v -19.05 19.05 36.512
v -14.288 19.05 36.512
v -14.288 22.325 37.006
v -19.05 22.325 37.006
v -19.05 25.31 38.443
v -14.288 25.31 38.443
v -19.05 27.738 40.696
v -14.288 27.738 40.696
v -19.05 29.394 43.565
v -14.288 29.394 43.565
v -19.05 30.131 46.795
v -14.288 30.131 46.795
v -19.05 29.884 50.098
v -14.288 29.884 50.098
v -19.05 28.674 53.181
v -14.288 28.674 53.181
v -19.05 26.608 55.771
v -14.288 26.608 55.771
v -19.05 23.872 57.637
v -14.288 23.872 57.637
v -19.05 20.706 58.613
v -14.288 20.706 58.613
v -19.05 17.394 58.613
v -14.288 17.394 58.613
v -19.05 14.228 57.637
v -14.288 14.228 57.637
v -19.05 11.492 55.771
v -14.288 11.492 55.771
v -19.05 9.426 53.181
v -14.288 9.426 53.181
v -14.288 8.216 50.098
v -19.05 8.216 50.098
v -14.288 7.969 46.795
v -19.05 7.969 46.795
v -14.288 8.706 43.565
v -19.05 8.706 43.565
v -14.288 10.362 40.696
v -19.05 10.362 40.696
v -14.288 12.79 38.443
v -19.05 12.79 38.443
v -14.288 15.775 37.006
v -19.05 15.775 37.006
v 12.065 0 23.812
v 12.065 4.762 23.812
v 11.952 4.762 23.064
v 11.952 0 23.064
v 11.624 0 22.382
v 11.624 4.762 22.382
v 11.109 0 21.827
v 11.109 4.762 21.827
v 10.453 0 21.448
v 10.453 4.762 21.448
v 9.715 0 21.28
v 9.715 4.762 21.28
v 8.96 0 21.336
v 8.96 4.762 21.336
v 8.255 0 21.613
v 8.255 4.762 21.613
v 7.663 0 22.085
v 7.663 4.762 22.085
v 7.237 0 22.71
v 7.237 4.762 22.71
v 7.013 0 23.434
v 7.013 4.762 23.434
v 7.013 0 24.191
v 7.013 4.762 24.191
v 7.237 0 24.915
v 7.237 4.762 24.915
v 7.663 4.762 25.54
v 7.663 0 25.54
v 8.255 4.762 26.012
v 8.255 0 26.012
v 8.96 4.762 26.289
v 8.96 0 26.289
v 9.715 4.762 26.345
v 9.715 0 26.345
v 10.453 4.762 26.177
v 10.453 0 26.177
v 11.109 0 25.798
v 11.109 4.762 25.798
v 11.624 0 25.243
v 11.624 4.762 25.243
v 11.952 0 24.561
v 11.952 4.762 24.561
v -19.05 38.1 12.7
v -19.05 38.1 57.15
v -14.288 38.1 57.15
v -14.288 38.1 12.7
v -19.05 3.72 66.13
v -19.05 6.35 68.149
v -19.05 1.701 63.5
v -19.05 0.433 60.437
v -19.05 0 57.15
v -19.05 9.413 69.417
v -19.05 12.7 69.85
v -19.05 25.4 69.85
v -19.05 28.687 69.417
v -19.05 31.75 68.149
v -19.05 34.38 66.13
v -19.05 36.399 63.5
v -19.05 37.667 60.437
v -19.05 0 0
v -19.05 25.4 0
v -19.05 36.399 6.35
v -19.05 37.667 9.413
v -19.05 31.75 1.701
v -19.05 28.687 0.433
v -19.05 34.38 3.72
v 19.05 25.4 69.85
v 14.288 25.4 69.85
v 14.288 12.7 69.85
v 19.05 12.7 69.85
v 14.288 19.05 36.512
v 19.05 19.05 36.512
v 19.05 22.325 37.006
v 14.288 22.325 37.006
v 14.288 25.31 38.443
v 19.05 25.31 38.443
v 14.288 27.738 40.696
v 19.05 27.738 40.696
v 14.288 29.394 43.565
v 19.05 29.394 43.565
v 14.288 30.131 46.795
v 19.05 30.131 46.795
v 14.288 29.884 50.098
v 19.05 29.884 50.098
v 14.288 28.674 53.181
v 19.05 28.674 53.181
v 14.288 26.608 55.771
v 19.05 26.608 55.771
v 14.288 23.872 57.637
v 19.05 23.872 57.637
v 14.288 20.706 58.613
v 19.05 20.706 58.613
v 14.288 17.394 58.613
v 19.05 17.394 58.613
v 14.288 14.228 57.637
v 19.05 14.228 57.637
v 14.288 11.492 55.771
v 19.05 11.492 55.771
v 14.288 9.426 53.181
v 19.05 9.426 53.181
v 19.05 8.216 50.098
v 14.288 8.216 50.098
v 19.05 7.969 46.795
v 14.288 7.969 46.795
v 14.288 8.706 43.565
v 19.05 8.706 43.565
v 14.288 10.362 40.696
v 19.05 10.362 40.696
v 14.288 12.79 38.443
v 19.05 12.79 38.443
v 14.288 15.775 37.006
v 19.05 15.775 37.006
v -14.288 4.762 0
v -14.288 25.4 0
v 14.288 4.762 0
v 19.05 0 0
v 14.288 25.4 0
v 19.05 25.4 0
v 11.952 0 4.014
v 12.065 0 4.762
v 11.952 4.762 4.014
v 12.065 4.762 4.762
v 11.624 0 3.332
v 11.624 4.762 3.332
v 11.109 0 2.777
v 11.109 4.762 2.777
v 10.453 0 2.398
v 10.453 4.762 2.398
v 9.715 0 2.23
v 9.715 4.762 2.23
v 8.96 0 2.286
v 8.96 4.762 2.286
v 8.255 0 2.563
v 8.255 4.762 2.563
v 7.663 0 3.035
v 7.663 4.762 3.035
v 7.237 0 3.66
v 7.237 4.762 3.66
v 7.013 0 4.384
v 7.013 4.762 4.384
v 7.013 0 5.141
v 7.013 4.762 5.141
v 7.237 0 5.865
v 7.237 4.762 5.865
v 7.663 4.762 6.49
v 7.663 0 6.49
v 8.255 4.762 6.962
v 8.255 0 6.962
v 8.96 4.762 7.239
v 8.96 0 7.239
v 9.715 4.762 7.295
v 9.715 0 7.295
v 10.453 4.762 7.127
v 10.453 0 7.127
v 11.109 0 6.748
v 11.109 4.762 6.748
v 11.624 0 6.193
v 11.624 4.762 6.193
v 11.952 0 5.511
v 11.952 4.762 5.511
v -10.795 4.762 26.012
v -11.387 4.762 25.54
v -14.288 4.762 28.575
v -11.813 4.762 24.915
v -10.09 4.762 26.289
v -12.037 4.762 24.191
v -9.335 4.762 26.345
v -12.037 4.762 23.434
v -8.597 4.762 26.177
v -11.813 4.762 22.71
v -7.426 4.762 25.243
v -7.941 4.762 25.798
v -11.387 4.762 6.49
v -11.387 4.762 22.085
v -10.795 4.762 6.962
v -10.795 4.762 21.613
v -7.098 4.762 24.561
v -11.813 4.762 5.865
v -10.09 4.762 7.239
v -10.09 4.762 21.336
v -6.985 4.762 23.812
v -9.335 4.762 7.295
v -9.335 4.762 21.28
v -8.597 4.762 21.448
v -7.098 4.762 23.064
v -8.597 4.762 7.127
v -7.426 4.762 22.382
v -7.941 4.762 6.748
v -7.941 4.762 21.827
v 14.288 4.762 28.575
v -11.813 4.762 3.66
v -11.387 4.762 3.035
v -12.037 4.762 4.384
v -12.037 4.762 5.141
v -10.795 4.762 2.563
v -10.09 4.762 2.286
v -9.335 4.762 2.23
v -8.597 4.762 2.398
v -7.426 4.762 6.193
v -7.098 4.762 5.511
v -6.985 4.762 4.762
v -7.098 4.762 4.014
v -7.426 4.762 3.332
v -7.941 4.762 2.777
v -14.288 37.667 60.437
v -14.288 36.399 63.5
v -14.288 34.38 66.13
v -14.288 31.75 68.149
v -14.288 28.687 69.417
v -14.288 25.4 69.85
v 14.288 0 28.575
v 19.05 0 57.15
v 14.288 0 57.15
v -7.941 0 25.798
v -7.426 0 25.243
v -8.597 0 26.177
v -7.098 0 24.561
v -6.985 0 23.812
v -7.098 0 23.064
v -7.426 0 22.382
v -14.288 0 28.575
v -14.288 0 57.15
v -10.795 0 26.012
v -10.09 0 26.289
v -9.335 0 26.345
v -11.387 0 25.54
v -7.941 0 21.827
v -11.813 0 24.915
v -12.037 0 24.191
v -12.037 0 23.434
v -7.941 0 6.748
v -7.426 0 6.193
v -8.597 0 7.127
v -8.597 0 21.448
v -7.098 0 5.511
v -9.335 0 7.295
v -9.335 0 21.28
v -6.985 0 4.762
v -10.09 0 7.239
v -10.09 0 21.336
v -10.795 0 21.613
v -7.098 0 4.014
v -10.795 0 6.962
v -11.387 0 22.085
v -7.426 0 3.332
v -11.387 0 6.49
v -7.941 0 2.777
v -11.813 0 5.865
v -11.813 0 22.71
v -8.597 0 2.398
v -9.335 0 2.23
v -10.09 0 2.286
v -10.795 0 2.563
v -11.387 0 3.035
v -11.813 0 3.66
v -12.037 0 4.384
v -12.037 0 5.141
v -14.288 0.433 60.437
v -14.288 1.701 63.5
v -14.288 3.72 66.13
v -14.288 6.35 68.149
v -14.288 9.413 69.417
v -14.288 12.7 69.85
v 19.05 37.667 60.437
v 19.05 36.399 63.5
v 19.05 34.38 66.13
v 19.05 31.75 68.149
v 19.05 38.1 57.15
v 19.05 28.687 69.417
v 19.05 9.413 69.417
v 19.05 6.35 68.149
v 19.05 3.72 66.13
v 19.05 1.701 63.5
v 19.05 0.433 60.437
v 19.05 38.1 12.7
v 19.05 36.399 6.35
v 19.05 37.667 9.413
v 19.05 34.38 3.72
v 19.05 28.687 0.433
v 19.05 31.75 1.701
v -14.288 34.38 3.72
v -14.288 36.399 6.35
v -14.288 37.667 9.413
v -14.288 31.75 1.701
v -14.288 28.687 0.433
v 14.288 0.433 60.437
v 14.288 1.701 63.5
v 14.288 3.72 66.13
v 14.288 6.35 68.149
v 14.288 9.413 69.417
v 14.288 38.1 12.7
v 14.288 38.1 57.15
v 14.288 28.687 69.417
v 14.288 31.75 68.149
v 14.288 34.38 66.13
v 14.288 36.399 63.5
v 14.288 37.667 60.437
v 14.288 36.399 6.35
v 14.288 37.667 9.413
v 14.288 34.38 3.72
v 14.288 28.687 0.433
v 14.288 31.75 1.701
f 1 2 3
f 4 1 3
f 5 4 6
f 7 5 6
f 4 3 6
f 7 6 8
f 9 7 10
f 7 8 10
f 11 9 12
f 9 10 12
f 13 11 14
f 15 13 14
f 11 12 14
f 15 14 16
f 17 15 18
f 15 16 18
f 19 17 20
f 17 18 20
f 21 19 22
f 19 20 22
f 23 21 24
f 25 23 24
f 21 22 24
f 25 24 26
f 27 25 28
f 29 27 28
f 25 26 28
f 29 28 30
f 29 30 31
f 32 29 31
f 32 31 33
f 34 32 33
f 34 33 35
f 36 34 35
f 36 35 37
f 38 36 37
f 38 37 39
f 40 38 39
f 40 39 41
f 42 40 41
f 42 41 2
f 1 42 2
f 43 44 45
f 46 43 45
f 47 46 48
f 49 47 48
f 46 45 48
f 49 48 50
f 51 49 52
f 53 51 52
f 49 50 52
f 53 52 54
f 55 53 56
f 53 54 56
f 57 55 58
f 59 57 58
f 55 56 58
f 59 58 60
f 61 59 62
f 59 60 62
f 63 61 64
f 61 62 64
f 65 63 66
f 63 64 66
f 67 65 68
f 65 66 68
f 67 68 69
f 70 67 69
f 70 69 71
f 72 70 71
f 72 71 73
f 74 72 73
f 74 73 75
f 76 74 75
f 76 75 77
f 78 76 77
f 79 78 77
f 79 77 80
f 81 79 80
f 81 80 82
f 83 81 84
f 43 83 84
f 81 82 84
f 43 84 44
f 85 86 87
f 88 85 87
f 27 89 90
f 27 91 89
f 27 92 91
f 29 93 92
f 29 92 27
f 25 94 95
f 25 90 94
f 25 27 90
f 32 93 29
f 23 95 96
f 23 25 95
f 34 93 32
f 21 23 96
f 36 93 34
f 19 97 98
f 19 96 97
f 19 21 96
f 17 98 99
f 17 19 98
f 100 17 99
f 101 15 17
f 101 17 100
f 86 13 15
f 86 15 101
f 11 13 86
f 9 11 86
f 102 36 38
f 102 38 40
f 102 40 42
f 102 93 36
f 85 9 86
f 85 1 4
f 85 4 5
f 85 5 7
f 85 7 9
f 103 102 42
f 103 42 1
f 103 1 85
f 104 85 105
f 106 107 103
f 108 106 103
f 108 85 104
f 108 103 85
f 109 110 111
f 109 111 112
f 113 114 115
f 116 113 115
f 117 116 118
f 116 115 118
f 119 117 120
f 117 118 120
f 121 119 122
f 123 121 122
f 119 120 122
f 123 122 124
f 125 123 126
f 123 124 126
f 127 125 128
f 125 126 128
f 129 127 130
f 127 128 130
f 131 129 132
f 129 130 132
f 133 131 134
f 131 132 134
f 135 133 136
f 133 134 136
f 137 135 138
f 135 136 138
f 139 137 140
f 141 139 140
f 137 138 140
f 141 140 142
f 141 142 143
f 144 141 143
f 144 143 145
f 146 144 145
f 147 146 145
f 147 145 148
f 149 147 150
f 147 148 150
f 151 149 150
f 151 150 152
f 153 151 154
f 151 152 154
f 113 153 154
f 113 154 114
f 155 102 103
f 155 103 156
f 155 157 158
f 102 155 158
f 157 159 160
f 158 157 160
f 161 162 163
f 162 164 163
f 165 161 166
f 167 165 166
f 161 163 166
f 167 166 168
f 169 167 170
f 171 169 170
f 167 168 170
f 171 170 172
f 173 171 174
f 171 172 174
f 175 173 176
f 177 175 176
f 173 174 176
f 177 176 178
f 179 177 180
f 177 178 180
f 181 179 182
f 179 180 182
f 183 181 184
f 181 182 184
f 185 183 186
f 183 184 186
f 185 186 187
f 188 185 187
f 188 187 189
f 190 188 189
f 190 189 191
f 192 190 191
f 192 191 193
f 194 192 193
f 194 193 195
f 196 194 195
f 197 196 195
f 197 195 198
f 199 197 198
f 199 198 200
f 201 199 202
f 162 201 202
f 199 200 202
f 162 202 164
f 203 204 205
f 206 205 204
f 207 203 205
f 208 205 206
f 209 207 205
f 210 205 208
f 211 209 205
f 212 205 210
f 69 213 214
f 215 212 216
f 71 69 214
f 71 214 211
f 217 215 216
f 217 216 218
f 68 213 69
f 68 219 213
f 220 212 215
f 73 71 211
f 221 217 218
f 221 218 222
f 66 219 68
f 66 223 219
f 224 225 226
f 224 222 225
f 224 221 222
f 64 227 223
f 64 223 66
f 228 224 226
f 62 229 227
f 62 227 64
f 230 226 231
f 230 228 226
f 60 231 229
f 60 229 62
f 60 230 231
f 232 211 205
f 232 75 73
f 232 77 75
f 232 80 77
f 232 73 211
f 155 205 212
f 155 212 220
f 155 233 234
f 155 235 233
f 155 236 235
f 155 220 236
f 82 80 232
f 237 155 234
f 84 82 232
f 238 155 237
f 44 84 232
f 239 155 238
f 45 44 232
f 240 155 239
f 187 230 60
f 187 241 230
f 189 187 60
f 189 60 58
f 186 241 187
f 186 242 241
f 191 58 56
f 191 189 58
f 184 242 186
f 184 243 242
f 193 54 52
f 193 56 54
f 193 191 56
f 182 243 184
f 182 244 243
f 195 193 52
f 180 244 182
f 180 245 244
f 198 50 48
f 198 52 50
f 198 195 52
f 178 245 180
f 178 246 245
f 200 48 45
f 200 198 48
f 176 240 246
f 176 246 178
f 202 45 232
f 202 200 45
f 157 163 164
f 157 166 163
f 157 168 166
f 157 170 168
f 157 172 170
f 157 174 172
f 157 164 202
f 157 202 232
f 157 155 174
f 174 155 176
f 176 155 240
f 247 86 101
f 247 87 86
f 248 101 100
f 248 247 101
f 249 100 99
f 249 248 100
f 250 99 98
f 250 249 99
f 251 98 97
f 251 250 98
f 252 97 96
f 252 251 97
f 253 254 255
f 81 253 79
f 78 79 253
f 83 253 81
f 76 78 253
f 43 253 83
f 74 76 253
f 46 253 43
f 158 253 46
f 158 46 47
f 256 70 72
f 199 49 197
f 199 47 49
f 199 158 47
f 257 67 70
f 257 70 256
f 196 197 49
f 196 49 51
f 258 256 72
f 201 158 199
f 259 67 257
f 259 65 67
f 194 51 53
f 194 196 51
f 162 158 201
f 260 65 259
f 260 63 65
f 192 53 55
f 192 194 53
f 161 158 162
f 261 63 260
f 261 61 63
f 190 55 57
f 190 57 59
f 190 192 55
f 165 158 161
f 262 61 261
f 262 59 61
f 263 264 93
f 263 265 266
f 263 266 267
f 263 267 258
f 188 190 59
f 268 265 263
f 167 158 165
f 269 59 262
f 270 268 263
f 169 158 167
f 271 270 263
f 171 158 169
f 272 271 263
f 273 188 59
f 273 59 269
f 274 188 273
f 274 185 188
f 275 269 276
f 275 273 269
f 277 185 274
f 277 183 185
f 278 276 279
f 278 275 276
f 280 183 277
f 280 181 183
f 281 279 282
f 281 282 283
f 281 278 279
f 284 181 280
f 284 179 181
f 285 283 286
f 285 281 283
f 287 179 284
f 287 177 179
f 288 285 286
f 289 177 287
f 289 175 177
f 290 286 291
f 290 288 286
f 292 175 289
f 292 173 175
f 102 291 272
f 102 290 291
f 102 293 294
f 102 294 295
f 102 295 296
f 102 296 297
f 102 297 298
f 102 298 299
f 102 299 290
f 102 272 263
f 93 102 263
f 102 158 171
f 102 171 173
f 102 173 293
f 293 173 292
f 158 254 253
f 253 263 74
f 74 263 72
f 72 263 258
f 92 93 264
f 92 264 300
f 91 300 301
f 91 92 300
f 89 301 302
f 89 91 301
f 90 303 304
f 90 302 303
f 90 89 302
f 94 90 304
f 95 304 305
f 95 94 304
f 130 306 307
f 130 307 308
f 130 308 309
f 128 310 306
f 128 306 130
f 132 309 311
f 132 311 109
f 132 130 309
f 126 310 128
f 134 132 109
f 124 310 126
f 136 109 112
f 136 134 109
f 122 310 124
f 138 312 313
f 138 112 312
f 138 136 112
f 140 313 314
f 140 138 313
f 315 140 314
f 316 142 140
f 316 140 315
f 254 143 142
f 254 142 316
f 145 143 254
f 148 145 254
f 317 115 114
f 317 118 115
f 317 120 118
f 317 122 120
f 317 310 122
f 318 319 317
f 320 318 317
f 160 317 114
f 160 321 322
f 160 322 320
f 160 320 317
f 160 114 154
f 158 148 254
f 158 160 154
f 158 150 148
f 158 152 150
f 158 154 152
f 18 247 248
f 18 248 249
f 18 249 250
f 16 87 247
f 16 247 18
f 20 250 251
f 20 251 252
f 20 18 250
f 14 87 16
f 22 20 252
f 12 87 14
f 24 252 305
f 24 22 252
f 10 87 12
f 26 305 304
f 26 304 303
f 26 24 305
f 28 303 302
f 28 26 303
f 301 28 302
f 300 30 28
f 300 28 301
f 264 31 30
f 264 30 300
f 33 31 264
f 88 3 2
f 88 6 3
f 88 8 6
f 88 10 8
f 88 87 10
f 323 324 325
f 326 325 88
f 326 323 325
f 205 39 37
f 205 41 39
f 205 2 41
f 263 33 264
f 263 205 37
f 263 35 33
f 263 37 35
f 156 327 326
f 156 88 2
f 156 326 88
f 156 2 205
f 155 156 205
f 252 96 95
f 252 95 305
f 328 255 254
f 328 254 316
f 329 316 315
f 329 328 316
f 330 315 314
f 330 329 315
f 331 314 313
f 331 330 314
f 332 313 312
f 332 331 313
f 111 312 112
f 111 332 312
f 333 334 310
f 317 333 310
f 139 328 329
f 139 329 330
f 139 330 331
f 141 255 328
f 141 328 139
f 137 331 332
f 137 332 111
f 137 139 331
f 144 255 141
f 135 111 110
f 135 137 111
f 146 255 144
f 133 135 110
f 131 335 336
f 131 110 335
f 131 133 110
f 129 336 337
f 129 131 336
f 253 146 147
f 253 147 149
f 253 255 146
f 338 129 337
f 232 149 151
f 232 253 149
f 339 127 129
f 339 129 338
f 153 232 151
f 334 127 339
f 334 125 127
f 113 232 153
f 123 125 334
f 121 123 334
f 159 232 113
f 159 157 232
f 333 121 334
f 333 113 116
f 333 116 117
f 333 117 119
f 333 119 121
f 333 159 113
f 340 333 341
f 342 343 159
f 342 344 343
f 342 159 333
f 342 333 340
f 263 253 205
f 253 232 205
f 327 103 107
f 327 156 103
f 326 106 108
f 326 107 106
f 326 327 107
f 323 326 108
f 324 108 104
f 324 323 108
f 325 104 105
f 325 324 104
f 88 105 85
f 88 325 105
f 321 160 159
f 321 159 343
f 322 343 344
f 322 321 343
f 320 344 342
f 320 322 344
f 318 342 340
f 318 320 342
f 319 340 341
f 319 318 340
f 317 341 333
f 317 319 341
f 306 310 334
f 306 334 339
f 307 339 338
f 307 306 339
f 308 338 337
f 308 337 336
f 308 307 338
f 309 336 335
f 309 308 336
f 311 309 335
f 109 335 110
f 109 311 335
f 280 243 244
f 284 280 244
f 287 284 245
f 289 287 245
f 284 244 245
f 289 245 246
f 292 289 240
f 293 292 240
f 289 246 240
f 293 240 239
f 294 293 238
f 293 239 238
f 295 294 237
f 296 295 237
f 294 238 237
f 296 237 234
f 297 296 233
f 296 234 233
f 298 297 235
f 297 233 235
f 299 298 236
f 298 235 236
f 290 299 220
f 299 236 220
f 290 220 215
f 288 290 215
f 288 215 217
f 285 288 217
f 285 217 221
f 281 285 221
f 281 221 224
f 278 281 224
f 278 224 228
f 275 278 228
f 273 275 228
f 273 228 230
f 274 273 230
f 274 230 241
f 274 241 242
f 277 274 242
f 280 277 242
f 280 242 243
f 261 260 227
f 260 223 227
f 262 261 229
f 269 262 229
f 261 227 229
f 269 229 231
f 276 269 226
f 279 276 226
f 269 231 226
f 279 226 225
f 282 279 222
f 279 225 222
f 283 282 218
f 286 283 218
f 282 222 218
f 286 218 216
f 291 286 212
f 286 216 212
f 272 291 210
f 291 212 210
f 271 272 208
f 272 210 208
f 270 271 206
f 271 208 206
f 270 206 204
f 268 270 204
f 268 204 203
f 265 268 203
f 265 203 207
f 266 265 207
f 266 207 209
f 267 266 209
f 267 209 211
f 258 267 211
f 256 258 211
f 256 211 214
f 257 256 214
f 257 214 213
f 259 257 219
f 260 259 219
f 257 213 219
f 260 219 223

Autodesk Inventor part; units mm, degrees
ref_plane "YZ Plane" through (0, 0, 0) normal (1, 0, 0) x (0, 1, 0)
ref_plane "XZ Plane" through (0, 0, 0) normal (0, 1, 0) x (-1, 0, 0)
ref_plane "XY Plane" through (0, 0, 0) normal (0, 0, 1) x (1, 0, 0)
sketch "Sketch1" plane through (0, 0, 0) normal (0, 0, 1) x (1, 0, 0)
  line L0 (-19.05, 38.1) -> (-14.2875, 38.1)
  line L1 (-14.2875, 38.1) -> (-14.2875, 4.7625)
  line L2 (-14.2875, 4.7625) -> (14.2875, 4.7625)
  line L3 (14.2875, 4.7625) -> (14.2875, 38.1)
  line L4 (14.2875, 38.1) -> (19.05, 38.1)
  line L5 (19.05, 38.1) -> (19.05, 0)
  line L6 (19.05, 0) -> (-19.05, 0)
  line L7 (-19.05, 0) -> (-19.05, 38.1)
  line L8 (0, 0) -> (0, 4.7625) construction
  dimension "d0" = 4.7625
  dimension "d2" = 38.1
  dimension "d3" = 38.1
extrude "Extrusion1" add sketch "Sketch1" along normal blind 69.85
sketch "Sketch2" plane through (-14.2875, 4.7625, 0) normal (0, 1, 0) x (1, 0, 0)
  line L0 (23.8125, -23.8125) -> (4.7625, -23.8125) construction
  line L1 (4.7625, -23.8125) -> (4.7625, -4.7625) construction
  line L2 (4.7625, -4.7625) -> (23.8125, -4.7625) construction
  line L3 (23.8125, -4.7625) -> (23.8125, -23.8125) construction
  line L4 (23.8125, -23.8125) -> (4.7625, -4.7625) construction
  line L5 (4.7625, -23.8125) -> (23.8125, -4.7625) construction
  circle A0 centre (4.7625, -4.7625) radius 2.54
  circle A1 centre (4.7625, -23.8125) radius 2.54
  circle A2 centre (23.8125, -4.7625) radius 2.54
  circle A3 centre (23.8125, -23.8125) radius 2.54
  line L6 (0, 0) -> (0, -69.85) projected
  line L7 (28.575, 0) -> (28.575, -69.85) projected
  line L8 (0, -69.85) -> (28.575, -69.85)
  line L9 (28.575, -69.85) -> (28.575, -28.575)
  line L10 (28.575, -28.575) -> (0, -28.575)
  line L11 (0, -28.575) -> (0, -69.85)
  line L12 (14.2875, -4.7625) -> (14.2875, 0) construction
  point P0 (14.2875, -14.2875)
  dimension "d6" = 5.08
  dimension "d7" = 19.05
  dimension "d8" = 19.05
  dimension "d10" = 14.2875
  dimension "d21" = 4.7625
  dimension "d22" = 4.7625
extrude "Extrusion2" cut sketch "Sketch2" against normal through all
sketch "Sketch3" plane through (19.05, 0, 0) normal (1, 0, 0) x (0, 0, -1)
  circle A0 centre (-47.625, 19.05) radius 11.1125
  circle A1 centre (-47.625, 19.05) radius 14.2875 construction
  line L0 (-33.3375, 19.05) -> (-33.3375, -6.9181) construction
  line L1 (0, 0) -> (-69.85, 0) construction
  dimension "d15" = 28.575
  dimension "d13" = 22.225
  dimension "d14" = 19.05
  dimension "d16" = 33.3375
extrude "Extrusion3" cut sketch "Sketch3" against normal through all
fillet "Fillet1" radius 12.7 6 edges at (16.6687, 38.1, 69.85) (-16.6687, 38.1, 69.85) (16.6687, 38.1, 0) (-16.6687, 38.1, 0) (-16.6688, 0, 69.85) (16.6688, 0, 69.85)
properties part number "top pully bracket" material "Aluminum 6061"
